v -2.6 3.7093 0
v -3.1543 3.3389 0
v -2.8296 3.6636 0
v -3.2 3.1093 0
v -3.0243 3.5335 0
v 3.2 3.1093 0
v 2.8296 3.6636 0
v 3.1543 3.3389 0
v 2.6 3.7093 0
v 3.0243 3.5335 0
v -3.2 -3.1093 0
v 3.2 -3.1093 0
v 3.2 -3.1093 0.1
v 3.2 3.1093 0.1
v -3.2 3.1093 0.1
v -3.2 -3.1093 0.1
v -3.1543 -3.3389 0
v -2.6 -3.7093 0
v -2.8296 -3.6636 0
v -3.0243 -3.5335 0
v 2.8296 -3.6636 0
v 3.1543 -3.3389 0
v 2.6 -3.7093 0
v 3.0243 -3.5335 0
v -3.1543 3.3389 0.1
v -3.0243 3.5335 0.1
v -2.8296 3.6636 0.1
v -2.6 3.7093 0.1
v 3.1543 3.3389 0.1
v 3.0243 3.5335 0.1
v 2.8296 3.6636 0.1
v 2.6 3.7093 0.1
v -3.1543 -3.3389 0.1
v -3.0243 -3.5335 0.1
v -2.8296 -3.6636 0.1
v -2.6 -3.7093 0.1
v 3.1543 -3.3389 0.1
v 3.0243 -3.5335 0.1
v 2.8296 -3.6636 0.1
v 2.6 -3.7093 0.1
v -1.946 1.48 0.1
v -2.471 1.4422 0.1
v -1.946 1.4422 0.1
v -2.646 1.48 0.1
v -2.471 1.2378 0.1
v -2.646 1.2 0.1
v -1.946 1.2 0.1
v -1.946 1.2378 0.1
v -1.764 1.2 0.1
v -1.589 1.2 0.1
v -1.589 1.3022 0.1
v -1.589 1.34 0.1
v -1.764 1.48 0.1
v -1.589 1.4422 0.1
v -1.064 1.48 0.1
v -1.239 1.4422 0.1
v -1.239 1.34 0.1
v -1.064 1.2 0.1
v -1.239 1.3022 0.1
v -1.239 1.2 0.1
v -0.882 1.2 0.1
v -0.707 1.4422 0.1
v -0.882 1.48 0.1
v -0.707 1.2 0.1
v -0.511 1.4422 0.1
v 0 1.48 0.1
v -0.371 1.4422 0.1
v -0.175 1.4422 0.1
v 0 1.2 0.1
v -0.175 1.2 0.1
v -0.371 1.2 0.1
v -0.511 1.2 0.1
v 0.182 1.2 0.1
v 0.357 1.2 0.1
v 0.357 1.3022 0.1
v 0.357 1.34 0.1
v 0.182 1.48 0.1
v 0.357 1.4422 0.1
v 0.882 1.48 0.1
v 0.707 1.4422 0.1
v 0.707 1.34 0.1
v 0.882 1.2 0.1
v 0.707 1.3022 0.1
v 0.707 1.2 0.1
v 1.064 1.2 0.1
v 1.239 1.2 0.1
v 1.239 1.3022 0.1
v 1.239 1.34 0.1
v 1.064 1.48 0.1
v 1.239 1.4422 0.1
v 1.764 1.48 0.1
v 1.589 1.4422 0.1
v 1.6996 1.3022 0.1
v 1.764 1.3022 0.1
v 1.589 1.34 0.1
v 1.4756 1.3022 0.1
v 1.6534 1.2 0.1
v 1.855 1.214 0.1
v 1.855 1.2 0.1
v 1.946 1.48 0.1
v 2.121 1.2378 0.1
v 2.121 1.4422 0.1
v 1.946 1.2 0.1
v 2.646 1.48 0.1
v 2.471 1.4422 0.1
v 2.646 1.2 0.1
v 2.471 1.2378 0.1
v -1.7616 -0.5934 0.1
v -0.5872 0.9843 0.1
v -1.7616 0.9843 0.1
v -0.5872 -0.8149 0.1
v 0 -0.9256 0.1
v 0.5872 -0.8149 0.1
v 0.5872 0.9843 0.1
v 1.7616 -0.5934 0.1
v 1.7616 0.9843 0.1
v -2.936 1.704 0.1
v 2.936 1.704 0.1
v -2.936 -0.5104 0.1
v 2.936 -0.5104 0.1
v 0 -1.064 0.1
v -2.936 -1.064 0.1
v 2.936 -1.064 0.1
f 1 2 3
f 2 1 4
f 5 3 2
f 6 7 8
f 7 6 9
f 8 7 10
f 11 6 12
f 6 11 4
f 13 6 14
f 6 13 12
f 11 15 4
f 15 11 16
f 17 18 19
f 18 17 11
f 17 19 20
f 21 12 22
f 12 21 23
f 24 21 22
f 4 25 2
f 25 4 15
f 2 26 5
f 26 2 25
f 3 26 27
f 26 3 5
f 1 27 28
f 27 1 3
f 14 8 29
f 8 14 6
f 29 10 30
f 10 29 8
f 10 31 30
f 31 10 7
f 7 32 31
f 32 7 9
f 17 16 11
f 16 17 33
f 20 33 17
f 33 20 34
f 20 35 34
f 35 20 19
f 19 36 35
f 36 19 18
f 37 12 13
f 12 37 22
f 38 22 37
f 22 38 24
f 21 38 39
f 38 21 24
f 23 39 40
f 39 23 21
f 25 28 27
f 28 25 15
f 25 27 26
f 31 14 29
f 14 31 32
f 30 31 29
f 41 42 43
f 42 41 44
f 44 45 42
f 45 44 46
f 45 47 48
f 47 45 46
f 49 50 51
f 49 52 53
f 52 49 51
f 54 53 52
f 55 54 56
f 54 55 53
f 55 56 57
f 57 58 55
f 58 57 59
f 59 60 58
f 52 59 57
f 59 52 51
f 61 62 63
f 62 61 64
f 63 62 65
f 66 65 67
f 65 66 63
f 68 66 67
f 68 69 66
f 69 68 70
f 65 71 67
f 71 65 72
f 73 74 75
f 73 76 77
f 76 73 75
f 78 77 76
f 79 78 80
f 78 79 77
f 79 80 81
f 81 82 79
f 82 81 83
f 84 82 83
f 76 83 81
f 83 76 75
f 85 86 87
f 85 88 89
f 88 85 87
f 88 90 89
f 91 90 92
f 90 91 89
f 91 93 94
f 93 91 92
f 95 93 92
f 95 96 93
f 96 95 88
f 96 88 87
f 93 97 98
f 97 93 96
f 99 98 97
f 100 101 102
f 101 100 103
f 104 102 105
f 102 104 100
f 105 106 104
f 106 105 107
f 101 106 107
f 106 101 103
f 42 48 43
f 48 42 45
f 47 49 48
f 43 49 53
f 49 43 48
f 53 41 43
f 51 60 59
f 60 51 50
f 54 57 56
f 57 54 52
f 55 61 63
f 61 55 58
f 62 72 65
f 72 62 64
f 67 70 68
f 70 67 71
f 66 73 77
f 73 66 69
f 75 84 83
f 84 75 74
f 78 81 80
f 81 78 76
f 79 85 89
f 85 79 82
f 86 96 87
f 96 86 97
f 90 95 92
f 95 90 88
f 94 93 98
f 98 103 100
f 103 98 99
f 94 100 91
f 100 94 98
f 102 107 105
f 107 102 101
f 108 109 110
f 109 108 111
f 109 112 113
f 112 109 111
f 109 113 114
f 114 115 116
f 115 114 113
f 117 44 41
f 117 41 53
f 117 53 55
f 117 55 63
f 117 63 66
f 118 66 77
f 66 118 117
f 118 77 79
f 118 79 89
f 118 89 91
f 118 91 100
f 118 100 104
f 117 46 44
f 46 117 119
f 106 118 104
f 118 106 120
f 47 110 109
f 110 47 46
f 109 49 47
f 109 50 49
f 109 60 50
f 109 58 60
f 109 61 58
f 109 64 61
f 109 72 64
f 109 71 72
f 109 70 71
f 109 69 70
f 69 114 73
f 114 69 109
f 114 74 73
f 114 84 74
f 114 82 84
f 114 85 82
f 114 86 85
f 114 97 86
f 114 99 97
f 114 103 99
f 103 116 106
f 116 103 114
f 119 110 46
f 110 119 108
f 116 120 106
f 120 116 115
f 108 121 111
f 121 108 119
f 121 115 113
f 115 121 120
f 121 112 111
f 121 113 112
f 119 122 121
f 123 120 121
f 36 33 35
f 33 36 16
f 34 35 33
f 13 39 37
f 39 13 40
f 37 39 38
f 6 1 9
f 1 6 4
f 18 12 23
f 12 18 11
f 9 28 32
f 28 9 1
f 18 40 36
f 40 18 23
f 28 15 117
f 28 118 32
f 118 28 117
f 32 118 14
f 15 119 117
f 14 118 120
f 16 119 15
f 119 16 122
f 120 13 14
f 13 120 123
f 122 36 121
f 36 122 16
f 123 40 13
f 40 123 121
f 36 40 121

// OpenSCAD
// file: ../p/box3u12.scad
use <../lib.scad>
function ldraw_lib__box3u12() = [
// 0 Box with 3 Parallel Faces without Any Edges
// 0 Name: box3u12.dat
// 0 Author: J.C. Tchang [tchang]
// 0 !LDRAW_ORG Primitive UPDATE 2014-02
// 0 !LICENSE Licensed under CC BY 4.0 : see CAreadme.txt
// 
// 0 BFC CERTIFY CCW
  [0,"BFC","CERTIFY"],
  [0,"BFC","CCW"],
// 
// 0 !HISTORY 2014-12-23 [PTadmin] Official Update 2014-02
// 
// 
// 4 16 -1 1 1 1 1 1 1 1 -1 -1 1 -1
  [4,16,-1,1,1,1,1,1,1,1,-1,-1,1,-1],
// 4 16 -1 1 1 -1 0 1 1 0 1 1 1 1
  [4,16,-1,1,1,-1,0,1,1,0,1,1,1,1],
// 4 16 1 1 -1 1 0 -1 -1 0 -1 -1 1 -1
  [4,16,1,1,-1,1,0,-1,-1,0,-1,-1,1,-1],
];
module ldraw_lib__box3u12(step=0, col=false, unit=2/5, alt=false, line=0.2, solid=!$preview)
    makepoly(ldraw_lib__box3u12(), step=step, col=col, unit=unit, alt=alt, line=line, solid=solid);
ldraw_lib__box3u12(line=0.2);
// file: ../p/1-4cyli.scad
use <../lib.scad>
function ldraw_lib__1_4cyli() = [
// 0 Cylinder 0.25
// 0 Name: 1-4cyli.dat
// 0 Author: James Jessiman
// 0 !LDRAW_ORG Primitive UPDATE 2012-01
// 0 !LICENSE Licensed under CC BY 4.0 : see CAreadme.txt
// 
// 0 BFC CERTIFY CCW
  [0,"BFC","CERTIFY"],
  [0,"BFC","CCW"],
// 
// 0 !HISTORY 2002-03-23 [sbliss] Added BFC statement.
// 0 !HISTORY 2002-04-25 [PTadmin] Official Update 2002-02
// 0 !HISTORY 2007-06-22 [PTadmin] Header formatted for Contributor Agreement
// 0 !HISTORY 2008-07-01 [PTadmin] Official Update 2008-01
// 0 !HISTORY 2012-02-16 [Philo] Changed to CCW
// 0 !HISTORY 2012-03-30 [PTadmin] Official Update 2012-01
// 
// 
// 4 16 1 1 0 0.9239 1 0.3827 0.9239 0 0.3827 1 0 0
  [4,16,1,1,0,0.9239,1,0.3827,0.9239,0,0.3827,1,0,0],
// 5 24 1 0 0 1 1 0 0.9239 0 0.3827 1 0 -1
  [5,24,1,0,0,1,1,0,0.9239,0,0.3827,1,0,-1],
// 4 16 0.9239 1 0.3827 0.7071 1 0.7071 0.7071 0 0.7071 0.9239 0 0.3827
  [4,16,0.9239,1,0.3827,0.7071,1,0.7071,0.7071,0,0.7071,0.9239,0,0.3827],
// 5 24 0.9239 0 0.3827 0.9239 1 0.3827 0.7071 0 0.7071 1 0 0
  [5,24,0.9239,0,0.3827,0.9239,1,0.3827,0.7071,0,0.7071,1,0,0],
// 4 16 0.7071 1 0.7071 0.3827 1 0.9239 0.3827 0 0.9239 0.7071 0 0.7071
  [4,16,0.7071,1,0.7071,0.3827,1,0.9239,0.3827,0,0.9239,0.7071,0,0.7071],
// 5 24 0.7071 0 0.7071 0.7071 1 0.7071 0.3827 0 0.9239 0.9239 0 0.3827
  [5,24,0.7071,0,0.7071,0.7071,1,0.7071,0.3827,0,0.9239,0.9239,0,0.3827],
// 4 16 0.3827 1 0.9239 0 1 1 0 0 1 0.3827 0 0.9239
  [4,16,0.3827,1,0.9239,0,1,1,0,0,1,0.3827,0,0.9239],
// 5 24 0.3827 0 0.9239 0.3827 1 0.9239 0 0 1 0.7071 0 0.7071
  [5,24,0.3827,0,0.9239,0.3827,1,0.9239,0,0,1,0.7071,0,0.7071],
// 5 24 0 0 1 0 1 1 0.3827 0 0.9239 -1 0 1
  [5,24,0,0,1,0,1,1,0.3827,0,0.9239,-1,0,1],
];
module ldraw_lib__1_4cyli(step=0, col=false, unit=2/5, alt=false, line=0.2, solid=!$preview)
    makepoly(ldraw_lib__1_4cyli(), step=step, col=col, unit=unit, alt=alt, line=line, solid=solid);
ldraw_lib__1_4cyli(line=0.2);
// file: ../p/1-4chrd.scad
use <../lib.scad>
function ldraw_lib__1_4chrd() = [
// 0 Chord 0.25
// 0 Name: 1-4chrd.dat
// 0 Author: Max Martin Richter [MMR1988]
// 0 !LDRAW_ORG Primitive UPDATE 2023-05
// 0 !LICENSE Licensed under CC BY 4.0 : see CAreadme.txt
// 
// 0 BFC CERTIFY CCW
  [0,"BFC","CERTIFY"],
  [0,"BFC","CCW"],
// 
// 0 !HISTORY 2004-04-22 [PTadmin] Official Update 2004-02
// 0 !HISTORY 2007-10-09 [PTadmin] Header formatted for Contributor Agreement
// 0 !HISTORY 2008-07-01 [PTadmin] Official Update 2008-01
// 0 !HISTORY 2012-08-02 [MMR1988] Re-creation with PrimGen2 and Rectifier
// 0 !HISTORY 2012-08-09 [PTadmin] Official Update 2012-02
// 0 !HISTORY 2023-10-27 [OrionP] Change author to MMR1988 from hafhead
// 0 !HISTORY 2023-10-31 [OrionP] Official Update 2023-05
// 
// 4 16 0.9239 0 0.3827 0.3827 0 0.9239 0 0 1 1 0 0
  [4,16,0.9239,0,0.3827,0.3827,0,0.9239,0,0,1,1,0,0],
// 3 16 0.7071 0 0.7071 0.3827 0 0.9239 0.9239 0 0.3827
  [3,16,0.7071,0,0.7071,0.3827,0,0.9239,0.9239,0,0.3827],
];
module ldraw_lib__1_4chrd(step=0, col=false, unit=2/5, alt=false, line=0.2, solid=!$preview)
    makepoly(ldraw_lib__1_4chrd(), step=step, col=col, unit=unit, alt=alt, line=line, solid=solid);
ldraw_lib__1_4chrd(line=0.2);
// main file
use <../lib.scad>
use <../p/1-4chrd.scad>
use <../p/1-4cyli.scad>
use <../p/box3u12.scad>
use <s/973py2s01.scad>
function ldraw_lib__6142617aa() = [
// 0 Sticker  0.9 x  0.8 with Camaro Logo on Red Background
// 0 Name: 6142617aa.dat
// 0 Author: Massimo Maso [Sirio]
// 0 !LDRAW_ORG Part UPDATE 2024-09
// 0 !LICENSE Licensed under CC BY 4.0 : see CAreadme.txt
// 
// 0 BFC CERTIFY CCW
  [0,"BFC","CERTIFY"],
  [0,"BFC","CCW"],
// 
// 0 !KEYWORDS Chevrolet, Drag, Race, Set 75874, Speed Champions, SS
// 
// 0 !HISTORY 2024-10-27 [OrionP] Official Update 2024-09
// 
// 
// 0 // Primitives
// 1 16 -6.5 0 7.7732 -1.5 0 0 0 -1 0 0 0 1.5 1-4chrd.dat
  [1,16,-6.5,0,7.7732,-1.5,0,0,0,-1,0,0,0,1.5, ldraw_lib__1_4chrd()],
// 1 16 6.5 0 7.7732 1.5 0 0 0 -1 0 0 0 1.5 1-4chrd.dat
  [1,16,6.5,0,7.7732,1.5,0,0,0,-1,0,0,0,1.5, ldraw_lib__1_4chrd()],
// 1 16 0 -.25 0 0 0 8 0 .25 0 7.7732 0 0 box3u12.dat
  [1,16,0,-.25,0,0,0,8,0,.25,0,7.7732,0,0, ldraw_lib__box3u12()],
// 1 16 -6.5 0 -7.7732 -1.5 0 0 0 -1 0 0 0 -1.5 1-4chrd.dat
  [1,16,-6.5,0,-7.7732,-1.5,0,0,0,-1,0,0,0,-1.5, ldraw_lib__1_4chrd()],
// 1 16 6.5 0 -7.7732 1.5 0 0 0 -1 0 0 0 -1.5 1-4chrd.dat
  [1,16,6.5,0,-7.7732,1.5,0,0,0,-1,0,0,0,-1.5, ldraw_lib__1_4chrd()],
// 1 16 -6.5 0 7.7732 -1.5 0 0 0 -.25 0 0 0 1.5 1-4cyli.dat
  [1,16,-6.5,0,7.7732,-1.5,0,0,0,-.25,0,0,0,1.5, ldraw_lib__1_4cyli()],
// 1 16 6.5 0 7.7732 1.5 0 0 0 -.25 0 0 0 1.5 1-4cyli.dat
  [1,16,6.5,0,7.7732,1.5,0,0,0,-.25,0,0,0,1.5, ldraw_lib__1_4cyli()],
// 1 16 -6.5 0 -7.7732 -1.5 0 0 0 -.25 0 0 0 -1.5 1-4cyli.dat
  [1,16,-6.5,0,-7.7732,-1.5,0,0,0,-.25,0,0,0,-1.5, ldraw_lib__1_4cyli()],
// 1 16 6.5 0 -7.7732 1.5 0 0 0 -.25 0 0 0 -1.5 1-4cyli.dat
  [1,16,6.5,0,-7.7732,1.5,0,0,0,-.25,0,0,0,-1.5, ldraw_lib__1_4cyli()],
// 1 4 -6.5 -.25 7.7732 -1.5 0 0 0 1 0 0 0 1.5 1-4chrd.dat
  [1,4,-6.5,-.25,7.7732,-1.5,0,0,0,1,0,0,0,1.5, ldraw_lib__1_4chrd()],
// 1 4 6.5 -.25 7.7732 1.5 0 0 0 1 0 0 0 1.5 1-4chrd.dat
  [1,4,6.5,-.25,7.7732,1.5,0,0,0,1,0,0,0,1.5, ldraw_lib__1_4chrd()],
// 1 4 0 -.25 .8 .2 0 0 0 1 0 0 0 .2 s\973py2s01.dat
  [1,4,0,-.25,.8,.2,0,0,0,1,0,0,0,.2, ldraw_lib__s__973py2s01()],
// 1 4 -6.5 -.25 -7.7732 -1.5 0 0 0 1 0 0 0 -1.5 1-4chrd.dat
  [1,4,-6.5,-.25,-7.7732,-1.5,0,0,0,1,0,0,0,-1.5, ldraw_lib__1_4chrd()],
// 1 4 6.5 -.25 -7.7732 1.5 0 0 0 1 0 0 0 -1.5 1-4chrd.dat
  [1,4,6.5,-.25,-7.7732,1.5,0,0,0,1,0,0,0,-1.5, ldraw_lib__1_4chrd()],
// 0 // Bottom face
// 4 16 6.5 0 9.2732 8 0 7.7732 -8 0 7.7732 -6.5 0 9.2732
  [4,16,6.5,0,9.2732,8,0,7.7732,-8,0,7.7732,-6.5,0,9.2732],
// 4 16 6.5 0 -9.2732 -6.5 0 -9.2732 -8 0 -7.7732 8 0 -7.7732
  [4,16,6.5,0,-9.2732,-6.5,0,-9.2732,-8,0,-7.7732,8,0,-7.7732],
// 0 // Lateral face
// 4 16 -6.5 0 9.2732 -6.5 -.25 9.2732 6.5 -.25 9.2732 6.5 0 9.2732
  [4,16,-6.5,0,9.2732,-6.5,-.25,9.2732,6.5,-.25,9.2732,6.5,0,9.2732],
// 4 16 -6.5 0 -9.2732 6.5 0 -9.2732 6.5 -.25 -9.2732 -6.5 -.25 -9.2732
  [4,16,-6.5,0,-9.2732,6.5,0,-9.2732,6.5,-.25,-9.2732,-6.5,-.25,-9.2732],
// 0 // Top face
// 0 // Red faces
// 3 4 -6.5 -.25 9.2732 -8 -.25 7.7732 -7.34 -.25 4.26
  [3,4,-6.5,-.25,9.2732,-8,-.25,7.7732,-7.34,-.25,4.26],
// 4 4 -6.5 -.25 9.2732 -7.34 -.25 4.26 7.34 -.25 4.26 6.5 -.25 9.2732
  [4,4,-6.5,-.25,9.2732,-7.34,-.25,4.26,7.34,-.25,4.26,6.5,-.25,9.2732],
// 3 4 6.5 -.25 9.2732 7.34 -.25 4.26 8 -.25 7.7732
  [3,4,6.5,-.25,9.2732,7.34,-.25,4.26,8,-.25,7.7732],
// 3 4 -8 -.25 7.7732 -7.34 -.25 -1.276 -7.34 -.25 4.26
  [3,4,-8,-.25,7.7732,-7.34,-.25,-1.276,-7.34,-.25,4.26],
// 3 4 8 -.25 7.7732 7.34 -.25 4.26 7.34 -.25 -1.276
  [3,4,8,-.25,7.7732,7.34,-.25,4.26,7.34,-.25,-1.276],
// 4 4 -8 -.25 -7.7732 -7.34 -.25 -2.66 -7.34 -.25 -1.276 -8 -.25 7.7732
  [4,4,-8,-.25,-7.7732,-7.34,-.25,-2.66,-7.34,-.25,-1.276,-8,-.25,7.7732],
// 4 4 8 -.25 -7.7732 8 -.25 7.7732 7.34 -.25 -1.276 7.34 -.25 -2.66
  [4,4,8,-.25,-7.7732,8,-.25,7.7732,7.34,-.25,-1.276,7.34,-.25,-2.66],
// 4 4 -8 -.25 -7.7732 -6.5 -.25 -9.2732 0 -.25 -2.66 -7.34 -.25 -2.66
  [4,4,-8,-.25,-7.7732,-6.5,-.25,-9.2732,0,-.25,-2.66,-7.34,-.25,-2.66],
// 4 4 8 -.25 -7.7732 7.34 -.25 -2.66 0 -.25 -2.66 6.5 -.25 -9.2732
  [4,4,8,-.25,-7.7732,7.34,-.25,-2.66,0,-.25,-2.66,6.5,-.25,-9.2732],
// 3 4 -6.5 -.25 -9.2732 6.5 -.25 -9.2732 0 -.25 -2.66
  [3,4,-6.5,-.25,-9.2732,6.5,-.25,-9.2732,0,-.25,-2.66],
];
module ldraw_lib__6142617aa(step=0, col=false, unit=2/5, alt=false, line=0.2, solid=!$preview)
    makepoly(ldraw_lib__6142617aa(), step=step, col=col, unit=unit, alt=alt, line=line, solid=solid);
ldraw_lib__6142617aa(line=0.2);
